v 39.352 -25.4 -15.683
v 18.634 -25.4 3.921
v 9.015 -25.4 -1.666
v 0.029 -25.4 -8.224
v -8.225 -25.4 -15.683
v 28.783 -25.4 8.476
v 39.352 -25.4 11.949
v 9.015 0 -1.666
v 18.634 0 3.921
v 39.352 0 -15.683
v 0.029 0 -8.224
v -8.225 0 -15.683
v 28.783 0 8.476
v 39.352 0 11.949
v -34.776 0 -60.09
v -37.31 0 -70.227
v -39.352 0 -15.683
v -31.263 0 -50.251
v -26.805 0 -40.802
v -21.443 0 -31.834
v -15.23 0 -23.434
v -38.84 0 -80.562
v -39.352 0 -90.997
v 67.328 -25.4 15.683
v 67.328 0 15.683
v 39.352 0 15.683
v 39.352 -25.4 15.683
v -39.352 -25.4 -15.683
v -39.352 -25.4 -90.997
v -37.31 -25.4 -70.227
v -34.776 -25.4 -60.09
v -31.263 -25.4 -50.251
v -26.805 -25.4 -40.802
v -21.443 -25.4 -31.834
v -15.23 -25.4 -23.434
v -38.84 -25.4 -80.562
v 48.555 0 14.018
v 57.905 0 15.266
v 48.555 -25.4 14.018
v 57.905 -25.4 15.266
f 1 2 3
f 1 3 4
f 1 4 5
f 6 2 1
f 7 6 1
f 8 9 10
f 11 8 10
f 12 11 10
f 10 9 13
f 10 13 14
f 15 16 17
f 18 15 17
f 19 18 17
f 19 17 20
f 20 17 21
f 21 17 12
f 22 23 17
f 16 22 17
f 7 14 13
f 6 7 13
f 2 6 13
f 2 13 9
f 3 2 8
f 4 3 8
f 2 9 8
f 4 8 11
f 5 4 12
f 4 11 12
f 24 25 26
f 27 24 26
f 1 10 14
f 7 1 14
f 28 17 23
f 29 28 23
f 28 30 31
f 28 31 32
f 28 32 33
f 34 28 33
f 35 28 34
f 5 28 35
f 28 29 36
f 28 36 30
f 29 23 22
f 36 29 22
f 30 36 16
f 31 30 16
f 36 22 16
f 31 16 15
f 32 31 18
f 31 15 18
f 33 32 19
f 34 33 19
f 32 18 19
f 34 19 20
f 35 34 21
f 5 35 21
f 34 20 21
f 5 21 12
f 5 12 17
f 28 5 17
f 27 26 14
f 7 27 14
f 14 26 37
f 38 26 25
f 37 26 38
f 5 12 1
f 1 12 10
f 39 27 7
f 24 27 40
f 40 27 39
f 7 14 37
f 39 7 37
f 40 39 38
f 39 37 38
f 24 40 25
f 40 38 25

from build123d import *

# Parameters (mm, degrees)
F1_DEPTH = 25.4


with BuildPart() as f1:
    # F0 (on Front) → F1 (new body)
    with BuildSketch(Plane.XZ):
        with BuildLine():
            ThreePointArc((39.351564, 11.948726), (53.21597, 14.744967), (67.328436, 15.682541))
            Line((67.328436, 15.682541), (39.351564, 15.682541))
            Line((39.351564, 15.682541), (39.351564, 11.948726))
        make_face()
        with BuildLine():
            ThreePointArc((-39.351564, -90.997459), (-31.26324, -50.250635), (-8.22476, -15.682541))
            Line((-8.22476, -15.682541), (-39.351564, -15.682541))
            Line((-39.351564, -15.682541), (-39.351564, -90.997459))
        make_face()
        with BuildLine():
            Line((39.351564, -15.682541), (39.351564, 11.948726))
            ThreePointArc((39.351564, 11.948726), (13.751477, 1.252917), (-8.22476, -15.682541))
            Line((-8.22476, -15.682541), (39.351564, -15.682541))
        make_face()
    extrude(amount=F1_DEPTH)


solid = f1.part
